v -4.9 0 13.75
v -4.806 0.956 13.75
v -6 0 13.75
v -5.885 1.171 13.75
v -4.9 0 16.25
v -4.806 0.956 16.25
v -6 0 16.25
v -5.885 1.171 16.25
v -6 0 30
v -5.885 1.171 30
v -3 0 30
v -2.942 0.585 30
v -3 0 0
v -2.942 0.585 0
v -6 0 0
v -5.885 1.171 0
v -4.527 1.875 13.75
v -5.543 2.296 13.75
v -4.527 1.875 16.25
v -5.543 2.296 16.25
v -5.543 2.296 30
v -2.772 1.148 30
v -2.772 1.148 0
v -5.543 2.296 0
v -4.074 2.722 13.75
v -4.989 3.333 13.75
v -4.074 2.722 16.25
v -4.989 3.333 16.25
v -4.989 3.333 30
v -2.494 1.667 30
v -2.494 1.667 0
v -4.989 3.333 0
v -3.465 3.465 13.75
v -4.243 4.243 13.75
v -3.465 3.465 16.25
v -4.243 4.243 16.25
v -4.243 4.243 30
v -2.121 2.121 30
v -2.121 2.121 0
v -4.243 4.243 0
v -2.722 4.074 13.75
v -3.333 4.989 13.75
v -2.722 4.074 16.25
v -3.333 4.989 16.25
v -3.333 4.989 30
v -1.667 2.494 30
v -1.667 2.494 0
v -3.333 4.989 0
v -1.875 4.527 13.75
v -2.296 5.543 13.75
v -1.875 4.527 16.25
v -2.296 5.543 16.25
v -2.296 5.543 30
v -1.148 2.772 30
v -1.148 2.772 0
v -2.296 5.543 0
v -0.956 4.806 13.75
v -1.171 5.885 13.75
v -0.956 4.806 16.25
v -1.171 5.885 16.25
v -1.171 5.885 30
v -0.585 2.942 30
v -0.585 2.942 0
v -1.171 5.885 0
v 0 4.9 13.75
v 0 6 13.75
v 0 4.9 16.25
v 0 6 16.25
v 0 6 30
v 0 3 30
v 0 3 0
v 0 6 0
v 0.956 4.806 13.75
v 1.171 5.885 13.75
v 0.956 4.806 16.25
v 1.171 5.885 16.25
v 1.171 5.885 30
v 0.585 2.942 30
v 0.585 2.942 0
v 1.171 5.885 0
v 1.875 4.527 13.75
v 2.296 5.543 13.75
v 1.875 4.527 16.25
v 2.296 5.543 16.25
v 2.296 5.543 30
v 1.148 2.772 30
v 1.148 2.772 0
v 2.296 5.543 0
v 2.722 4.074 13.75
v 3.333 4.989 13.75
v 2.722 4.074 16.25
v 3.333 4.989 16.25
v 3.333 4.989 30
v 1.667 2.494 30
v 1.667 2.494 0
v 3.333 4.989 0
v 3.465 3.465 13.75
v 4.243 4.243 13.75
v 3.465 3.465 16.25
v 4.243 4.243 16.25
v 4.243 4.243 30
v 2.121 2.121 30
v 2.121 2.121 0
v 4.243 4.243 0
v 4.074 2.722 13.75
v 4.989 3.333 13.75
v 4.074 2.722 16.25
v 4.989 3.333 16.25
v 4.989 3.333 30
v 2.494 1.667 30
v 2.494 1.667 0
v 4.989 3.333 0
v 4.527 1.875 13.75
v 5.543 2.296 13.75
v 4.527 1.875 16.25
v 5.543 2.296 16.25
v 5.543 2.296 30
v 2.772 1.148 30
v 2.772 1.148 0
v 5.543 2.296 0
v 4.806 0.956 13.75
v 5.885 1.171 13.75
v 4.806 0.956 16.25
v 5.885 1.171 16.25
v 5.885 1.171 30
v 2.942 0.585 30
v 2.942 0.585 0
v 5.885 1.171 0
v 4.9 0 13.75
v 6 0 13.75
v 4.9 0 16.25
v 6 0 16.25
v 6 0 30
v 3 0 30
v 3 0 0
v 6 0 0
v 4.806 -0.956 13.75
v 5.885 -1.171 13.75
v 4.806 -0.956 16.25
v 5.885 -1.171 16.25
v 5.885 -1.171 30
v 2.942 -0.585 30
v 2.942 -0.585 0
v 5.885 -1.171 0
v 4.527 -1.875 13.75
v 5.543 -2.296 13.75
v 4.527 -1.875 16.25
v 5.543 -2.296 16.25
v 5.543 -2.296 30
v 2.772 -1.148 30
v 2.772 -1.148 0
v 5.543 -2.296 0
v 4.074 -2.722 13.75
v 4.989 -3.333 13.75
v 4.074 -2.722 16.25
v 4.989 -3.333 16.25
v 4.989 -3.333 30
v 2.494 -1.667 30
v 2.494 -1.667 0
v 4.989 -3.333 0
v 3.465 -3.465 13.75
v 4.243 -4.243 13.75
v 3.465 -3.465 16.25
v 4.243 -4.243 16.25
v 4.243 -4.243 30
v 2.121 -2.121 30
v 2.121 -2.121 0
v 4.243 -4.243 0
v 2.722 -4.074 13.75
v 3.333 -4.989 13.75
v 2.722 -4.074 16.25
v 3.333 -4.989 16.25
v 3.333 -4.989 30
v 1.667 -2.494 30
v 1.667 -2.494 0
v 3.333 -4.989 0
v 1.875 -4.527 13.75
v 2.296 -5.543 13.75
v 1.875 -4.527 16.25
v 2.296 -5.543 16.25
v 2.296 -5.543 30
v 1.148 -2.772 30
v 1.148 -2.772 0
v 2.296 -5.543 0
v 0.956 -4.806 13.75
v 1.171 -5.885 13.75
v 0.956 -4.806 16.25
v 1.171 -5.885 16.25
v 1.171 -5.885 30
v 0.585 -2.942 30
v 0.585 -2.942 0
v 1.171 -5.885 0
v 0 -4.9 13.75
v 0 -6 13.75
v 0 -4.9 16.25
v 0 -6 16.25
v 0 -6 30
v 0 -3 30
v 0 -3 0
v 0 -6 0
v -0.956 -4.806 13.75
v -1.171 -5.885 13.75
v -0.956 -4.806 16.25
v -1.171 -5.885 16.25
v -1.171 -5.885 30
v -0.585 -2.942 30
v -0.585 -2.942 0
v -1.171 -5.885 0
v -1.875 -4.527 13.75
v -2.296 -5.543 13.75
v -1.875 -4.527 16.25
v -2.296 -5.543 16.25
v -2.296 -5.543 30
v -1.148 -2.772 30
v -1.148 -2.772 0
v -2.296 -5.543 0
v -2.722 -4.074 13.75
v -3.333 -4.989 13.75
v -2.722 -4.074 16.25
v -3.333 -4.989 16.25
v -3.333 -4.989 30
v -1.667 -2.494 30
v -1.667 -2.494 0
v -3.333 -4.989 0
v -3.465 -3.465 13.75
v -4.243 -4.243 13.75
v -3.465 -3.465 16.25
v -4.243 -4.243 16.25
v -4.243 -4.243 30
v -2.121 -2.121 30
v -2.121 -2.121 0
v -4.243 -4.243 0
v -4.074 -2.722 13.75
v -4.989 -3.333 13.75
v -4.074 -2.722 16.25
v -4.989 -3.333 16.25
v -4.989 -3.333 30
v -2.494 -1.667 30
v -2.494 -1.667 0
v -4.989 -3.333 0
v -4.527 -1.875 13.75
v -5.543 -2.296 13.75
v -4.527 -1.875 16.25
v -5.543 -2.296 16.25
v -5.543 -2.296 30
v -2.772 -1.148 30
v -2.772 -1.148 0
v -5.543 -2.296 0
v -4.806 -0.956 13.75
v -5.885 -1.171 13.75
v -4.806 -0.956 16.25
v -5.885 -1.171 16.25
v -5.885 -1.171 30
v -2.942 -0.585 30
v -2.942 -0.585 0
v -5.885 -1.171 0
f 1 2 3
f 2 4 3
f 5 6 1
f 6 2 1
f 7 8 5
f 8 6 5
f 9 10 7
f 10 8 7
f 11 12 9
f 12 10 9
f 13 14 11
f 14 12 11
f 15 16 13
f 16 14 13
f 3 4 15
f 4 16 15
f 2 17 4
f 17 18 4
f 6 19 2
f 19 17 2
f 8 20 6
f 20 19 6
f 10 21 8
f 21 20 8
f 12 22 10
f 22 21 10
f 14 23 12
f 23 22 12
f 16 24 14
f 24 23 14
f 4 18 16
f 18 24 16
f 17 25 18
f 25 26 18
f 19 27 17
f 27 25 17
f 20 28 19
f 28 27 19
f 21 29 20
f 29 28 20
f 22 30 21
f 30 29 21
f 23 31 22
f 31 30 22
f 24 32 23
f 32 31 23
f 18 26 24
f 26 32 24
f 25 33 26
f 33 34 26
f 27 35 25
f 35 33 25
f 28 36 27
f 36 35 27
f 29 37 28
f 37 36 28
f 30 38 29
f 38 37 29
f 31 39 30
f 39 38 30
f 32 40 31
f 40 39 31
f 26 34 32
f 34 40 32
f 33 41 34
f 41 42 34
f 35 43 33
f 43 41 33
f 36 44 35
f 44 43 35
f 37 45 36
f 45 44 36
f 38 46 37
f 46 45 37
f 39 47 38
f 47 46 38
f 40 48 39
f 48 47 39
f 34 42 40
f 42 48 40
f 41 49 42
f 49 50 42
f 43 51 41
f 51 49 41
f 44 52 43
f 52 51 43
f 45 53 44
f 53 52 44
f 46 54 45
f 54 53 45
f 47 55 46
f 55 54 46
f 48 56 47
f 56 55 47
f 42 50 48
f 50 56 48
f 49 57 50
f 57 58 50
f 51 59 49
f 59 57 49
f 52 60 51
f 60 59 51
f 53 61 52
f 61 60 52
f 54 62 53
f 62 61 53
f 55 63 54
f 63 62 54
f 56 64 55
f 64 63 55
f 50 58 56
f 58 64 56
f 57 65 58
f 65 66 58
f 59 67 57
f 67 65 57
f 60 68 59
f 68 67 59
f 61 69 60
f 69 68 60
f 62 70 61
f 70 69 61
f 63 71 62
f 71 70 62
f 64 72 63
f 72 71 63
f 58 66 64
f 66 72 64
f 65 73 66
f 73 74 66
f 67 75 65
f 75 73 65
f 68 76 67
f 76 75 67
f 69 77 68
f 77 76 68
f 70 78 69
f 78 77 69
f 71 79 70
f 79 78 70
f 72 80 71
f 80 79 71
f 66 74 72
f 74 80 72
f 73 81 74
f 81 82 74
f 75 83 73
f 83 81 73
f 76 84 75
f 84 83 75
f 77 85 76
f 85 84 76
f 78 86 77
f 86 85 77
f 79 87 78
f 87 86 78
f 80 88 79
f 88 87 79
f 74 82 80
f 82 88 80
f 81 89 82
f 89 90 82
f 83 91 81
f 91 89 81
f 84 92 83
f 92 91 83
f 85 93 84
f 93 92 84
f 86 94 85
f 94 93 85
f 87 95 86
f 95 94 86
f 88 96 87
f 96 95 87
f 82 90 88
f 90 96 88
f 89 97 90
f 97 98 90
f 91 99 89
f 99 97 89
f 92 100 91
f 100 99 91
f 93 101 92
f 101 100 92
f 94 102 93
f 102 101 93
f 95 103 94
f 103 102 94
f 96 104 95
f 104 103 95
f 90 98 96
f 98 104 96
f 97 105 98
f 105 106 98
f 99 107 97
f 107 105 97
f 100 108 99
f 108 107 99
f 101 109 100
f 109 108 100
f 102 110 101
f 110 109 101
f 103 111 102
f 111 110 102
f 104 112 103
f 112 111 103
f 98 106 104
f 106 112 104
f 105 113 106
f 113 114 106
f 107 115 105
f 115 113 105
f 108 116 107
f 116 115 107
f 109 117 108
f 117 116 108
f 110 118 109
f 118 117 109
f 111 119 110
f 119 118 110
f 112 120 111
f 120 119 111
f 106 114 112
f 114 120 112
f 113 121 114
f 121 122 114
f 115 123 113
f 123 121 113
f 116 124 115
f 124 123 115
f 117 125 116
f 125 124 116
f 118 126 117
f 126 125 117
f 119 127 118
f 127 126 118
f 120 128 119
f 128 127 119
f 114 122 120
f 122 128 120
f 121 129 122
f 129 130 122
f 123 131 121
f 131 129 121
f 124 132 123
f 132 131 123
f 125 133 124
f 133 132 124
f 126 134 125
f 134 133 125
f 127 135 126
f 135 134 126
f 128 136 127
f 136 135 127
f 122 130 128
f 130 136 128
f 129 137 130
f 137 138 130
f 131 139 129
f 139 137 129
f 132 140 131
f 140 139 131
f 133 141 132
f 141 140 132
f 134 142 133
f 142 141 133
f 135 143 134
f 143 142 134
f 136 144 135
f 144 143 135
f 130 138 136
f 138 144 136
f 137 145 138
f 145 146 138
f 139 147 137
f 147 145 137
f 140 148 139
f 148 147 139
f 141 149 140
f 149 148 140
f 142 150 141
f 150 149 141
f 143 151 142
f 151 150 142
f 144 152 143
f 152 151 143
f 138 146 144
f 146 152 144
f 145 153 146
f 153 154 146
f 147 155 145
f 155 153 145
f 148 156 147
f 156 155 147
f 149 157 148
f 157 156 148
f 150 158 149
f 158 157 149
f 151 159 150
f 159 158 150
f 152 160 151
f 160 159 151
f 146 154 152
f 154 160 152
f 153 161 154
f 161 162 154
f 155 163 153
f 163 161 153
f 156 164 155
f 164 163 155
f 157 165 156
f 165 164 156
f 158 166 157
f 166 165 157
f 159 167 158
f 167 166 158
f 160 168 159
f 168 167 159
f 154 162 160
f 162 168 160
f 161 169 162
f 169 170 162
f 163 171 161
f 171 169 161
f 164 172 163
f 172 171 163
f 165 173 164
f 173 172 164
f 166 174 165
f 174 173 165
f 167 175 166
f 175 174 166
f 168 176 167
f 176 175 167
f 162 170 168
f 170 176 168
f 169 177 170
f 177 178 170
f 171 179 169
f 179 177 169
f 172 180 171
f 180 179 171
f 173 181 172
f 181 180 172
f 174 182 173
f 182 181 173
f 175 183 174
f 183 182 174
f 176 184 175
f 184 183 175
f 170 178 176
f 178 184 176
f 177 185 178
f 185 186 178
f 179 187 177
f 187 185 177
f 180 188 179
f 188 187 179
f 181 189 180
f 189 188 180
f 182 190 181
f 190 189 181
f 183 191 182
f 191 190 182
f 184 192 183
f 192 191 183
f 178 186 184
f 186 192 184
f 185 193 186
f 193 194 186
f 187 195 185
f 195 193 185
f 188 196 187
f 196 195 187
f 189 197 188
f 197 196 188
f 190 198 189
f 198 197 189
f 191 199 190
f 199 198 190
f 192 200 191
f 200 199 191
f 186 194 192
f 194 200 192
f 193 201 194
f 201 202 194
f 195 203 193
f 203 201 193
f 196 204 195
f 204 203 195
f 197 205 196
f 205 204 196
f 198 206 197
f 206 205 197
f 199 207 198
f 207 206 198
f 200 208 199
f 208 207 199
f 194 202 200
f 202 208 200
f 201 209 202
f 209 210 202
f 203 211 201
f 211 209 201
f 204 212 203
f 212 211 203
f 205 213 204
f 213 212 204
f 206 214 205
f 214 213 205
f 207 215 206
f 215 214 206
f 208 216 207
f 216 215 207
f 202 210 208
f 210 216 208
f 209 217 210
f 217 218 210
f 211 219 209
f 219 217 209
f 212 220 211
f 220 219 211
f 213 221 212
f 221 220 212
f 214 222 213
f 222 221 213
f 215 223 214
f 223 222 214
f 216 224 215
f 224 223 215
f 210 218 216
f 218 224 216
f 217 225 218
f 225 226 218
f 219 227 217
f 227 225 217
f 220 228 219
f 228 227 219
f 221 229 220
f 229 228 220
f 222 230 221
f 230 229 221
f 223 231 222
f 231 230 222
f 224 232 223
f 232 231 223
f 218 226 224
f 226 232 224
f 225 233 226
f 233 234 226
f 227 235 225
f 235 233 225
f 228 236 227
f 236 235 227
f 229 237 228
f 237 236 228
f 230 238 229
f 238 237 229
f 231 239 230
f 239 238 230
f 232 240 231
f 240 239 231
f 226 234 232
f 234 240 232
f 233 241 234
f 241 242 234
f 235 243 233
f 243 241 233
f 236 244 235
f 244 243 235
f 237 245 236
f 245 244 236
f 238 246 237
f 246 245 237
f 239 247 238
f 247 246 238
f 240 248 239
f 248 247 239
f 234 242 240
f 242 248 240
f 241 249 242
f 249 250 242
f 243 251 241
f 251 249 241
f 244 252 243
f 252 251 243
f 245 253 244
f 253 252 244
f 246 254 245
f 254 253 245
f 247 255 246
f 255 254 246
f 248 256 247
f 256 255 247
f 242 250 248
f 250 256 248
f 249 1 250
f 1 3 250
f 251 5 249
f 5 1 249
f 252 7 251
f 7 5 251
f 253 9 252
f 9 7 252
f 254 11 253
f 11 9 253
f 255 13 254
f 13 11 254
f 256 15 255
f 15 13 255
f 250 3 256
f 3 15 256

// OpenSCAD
$fn = 32;

// ----------------------------------------------------------------------
// Grooved revolve: stepped, bore R3
// ----------------------------------------------------------------------

// --- parameters (mm) ---
bore_r = 3;               // bore radius
outer_r = 6;              // outer radius of the body
total_h = 30;             // overall height, Z
wall = 3;                 // radial wall thickness
groove_w = 2.5;           // groove width
groove_d = 1.1;           // groove depth
grooves = 1;              // number of outer grooves

bbox_x = 2 * outer_r;  // full diameter
bore_d = 2 * bore_r;  // bore diameter
body_d = 2 * outer_r;  // body diameter
revolve_angle = 360;  // full turn around the Z axis

profile = [[3, 0], [6, 0], [6, 13.75], [4.9, 13.75], [4.9, 16.25], [6, 16.25], [6, 30], [3, 30]];  // primary outline, 8 points, counter clockwise

// --- the one profile operation ---
rotate_extrude(angle = revolve_angle) polygon(points = profile);
